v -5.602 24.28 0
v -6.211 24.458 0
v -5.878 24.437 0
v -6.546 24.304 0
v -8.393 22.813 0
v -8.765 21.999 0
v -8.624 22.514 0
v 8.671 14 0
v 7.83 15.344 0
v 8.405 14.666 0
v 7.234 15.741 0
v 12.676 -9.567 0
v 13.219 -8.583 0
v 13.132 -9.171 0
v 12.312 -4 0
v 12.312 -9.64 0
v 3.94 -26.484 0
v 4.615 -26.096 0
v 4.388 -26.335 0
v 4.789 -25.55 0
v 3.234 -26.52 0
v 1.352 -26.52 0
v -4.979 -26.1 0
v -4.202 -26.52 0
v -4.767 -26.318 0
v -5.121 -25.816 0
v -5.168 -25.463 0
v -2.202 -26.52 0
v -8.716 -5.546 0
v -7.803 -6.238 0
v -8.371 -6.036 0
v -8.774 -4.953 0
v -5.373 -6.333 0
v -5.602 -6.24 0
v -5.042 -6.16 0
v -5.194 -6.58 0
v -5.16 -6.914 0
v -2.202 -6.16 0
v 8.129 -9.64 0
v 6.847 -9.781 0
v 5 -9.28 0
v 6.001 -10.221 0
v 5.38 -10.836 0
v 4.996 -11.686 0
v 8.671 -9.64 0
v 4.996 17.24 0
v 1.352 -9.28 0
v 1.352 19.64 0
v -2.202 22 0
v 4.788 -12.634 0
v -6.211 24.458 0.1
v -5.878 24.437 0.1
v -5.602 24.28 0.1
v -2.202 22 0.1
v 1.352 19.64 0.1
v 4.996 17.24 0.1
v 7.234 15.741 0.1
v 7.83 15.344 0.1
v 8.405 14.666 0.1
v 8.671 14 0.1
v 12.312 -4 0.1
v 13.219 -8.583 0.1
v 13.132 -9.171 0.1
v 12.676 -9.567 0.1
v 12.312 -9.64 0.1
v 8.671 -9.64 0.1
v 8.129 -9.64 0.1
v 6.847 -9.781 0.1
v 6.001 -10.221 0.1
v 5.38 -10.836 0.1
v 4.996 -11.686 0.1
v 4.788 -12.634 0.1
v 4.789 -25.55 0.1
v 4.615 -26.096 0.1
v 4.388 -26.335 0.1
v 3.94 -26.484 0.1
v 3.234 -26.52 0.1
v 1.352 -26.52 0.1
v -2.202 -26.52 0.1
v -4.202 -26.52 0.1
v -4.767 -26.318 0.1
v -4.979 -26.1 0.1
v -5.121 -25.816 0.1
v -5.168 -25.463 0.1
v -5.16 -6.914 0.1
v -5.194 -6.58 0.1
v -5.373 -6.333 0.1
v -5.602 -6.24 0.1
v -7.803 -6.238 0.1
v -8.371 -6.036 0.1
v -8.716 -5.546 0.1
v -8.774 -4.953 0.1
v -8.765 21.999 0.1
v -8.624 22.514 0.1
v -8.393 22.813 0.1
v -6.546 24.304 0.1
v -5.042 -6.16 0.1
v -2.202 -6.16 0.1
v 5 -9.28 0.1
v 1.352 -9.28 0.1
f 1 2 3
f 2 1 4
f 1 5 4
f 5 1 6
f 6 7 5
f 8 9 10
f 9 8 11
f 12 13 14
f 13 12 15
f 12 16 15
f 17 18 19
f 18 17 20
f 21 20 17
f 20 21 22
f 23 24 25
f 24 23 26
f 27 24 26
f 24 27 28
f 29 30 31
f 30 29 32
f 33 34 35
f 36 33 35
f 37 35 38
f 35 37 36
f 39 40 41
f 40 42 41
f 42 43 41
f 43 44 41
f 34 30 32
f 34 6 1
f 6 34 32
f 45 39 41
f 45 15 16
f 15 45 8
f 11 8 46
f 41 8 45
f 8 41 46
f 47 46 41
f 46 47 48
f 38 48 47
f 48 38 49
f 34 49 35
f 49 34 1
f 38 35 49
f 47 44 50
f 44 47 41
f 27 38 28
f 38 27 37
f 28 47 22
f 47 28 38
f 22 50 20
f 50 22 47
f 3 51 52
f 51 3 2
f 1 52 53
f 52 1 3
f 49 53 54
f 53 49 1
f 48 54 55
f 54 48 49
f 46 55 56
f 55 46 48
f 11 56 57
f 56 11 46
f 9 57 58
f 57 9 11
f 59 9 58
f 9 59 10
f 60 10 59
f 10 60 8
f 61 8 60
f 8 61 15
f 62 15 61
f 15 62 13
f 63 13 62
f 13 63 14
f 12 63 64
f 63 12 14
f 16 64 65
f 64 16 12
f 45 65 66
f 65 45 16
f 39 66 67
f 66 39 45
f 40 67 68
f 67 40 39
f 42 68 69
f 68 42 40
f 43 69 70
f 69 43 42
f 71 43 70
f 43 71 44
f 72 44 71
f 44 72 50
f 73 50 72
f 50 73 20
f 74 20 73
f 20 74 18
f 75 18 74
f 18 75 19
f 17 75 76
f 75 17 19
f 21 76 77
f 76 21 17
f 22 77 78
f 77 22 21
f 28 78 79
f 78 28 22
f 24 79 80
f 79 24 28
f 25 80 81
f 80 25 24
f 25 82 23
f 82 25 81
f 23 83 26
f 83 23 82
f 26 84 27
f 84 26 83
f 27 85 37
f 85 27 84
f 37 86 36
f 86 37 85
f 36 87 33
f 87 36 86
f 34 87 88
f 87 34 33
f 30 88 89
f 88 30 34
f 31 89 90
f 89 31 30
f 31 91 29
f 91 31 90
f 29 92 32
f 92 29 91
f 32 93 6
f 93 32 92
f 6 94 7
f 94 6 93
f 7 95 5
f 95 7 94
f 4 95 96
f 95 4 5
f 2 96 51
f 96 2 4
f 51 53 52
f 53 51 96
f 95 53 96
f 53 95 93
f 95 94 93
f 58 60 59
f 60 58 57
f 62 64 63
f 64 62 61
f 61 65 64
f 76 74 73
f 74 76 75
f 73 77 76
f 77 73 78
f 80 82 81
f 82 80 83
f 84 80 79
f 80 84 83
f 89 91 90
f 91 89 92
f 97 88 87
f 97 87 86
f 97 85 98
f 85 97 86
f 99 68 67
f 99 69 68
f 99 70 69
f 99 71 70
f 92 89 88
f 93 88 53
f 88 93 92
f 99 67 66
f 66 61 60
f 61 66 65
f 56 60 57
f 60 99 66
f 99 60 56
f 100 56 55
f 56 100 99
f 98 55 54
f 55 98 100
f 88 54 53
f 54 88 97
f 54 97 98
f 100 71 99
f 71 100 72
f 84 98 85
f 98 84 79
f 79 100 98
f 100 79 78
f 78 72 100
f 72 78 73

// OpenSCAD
// file: s/13710as02.scad
use <../../lib.scad>
function ldraw_lib__s__13710as02() = [
// 0 ~Sticker Top for Technic Panel Fairing Smooth (Medium) Flat
// 0 Name: s\13710as02.dat
// 0 Author: Philippe Hurbain [Philo]
// 0 !LDRAW_ORG Subpart UPDATE 2022-02
// 0 !LICENSE Licensed under CC BY 4.0 : see CAreadme.txt
// 
// 0 BFC CERTIFY CCW
  [0,"BFC","CERTIFY"],
  [0,"BFC","CCW"],
// 
// 0 !HISTORY 2022-03-06 [PTadmin] Official Update 2022-02
// 
// 
// 0 // Top surface
// 4 16 16.364 -0.25 60.759 15.527 -0.25 61.145 14.695 -0.25 61.093 14.004 -0.25 60.7
  [4,16,16.364,-0.25,60.759,15.527,-0.25,61.145,14.695,-0.25,61.093,14.004,-0.25,60.7],
// 4 16 21.912 -0.25 54.998 20.983 -0.25 57.032 16.364 -0.25 60.759 14.004 -0.25 60.7
  [4,16,21.912,-0.25,54.998,20.983,-0.25,57.032,16.364,-0.25,60.759,14.004,-0.25,60.7],
// 3 16 21.912 -0.25 54.998 21.561 -0.25 56.284 20.983 -0.25 57.032
  [3,16,21.912,-0.25,54.998,21.561,-0.25,56.284,20.983,-0.25,57.032],
// 4 16 -18.084 -0.25 39.353 -19.575 -0.25 38.36 -21.013 -0.25 36.664 -21.677 -0.25 35
  [4,16,-18.084,-0.25,39.353,-19.575,-0.25,38.36,-21.013,-0.25,36.664,-21.677,-0.25,35],
// 4 16 -31.689 -0.25 -23.918 -30.78 -0.25 -10 -33.048 -0.25 -21.458 -32.83 -0.25 -22.928
  [4,16,-31.689,-0.25,-23.918,-30.78,-0.25,-10,-33.048,-0.25,-21.458,-32.83,-0.25,-22.928],
// 3 16 -31.689 -0.25 -23.918 -30.78 -0.25 -24.1 -30.78 -0.25 -10
  [3,16,-31.689,-0.25,-23.918,-30.78,-0.25,-24.1,-30.78,-0.25,-10],
// 4 16 -9.849 -0.25 -66.209 -11.972 -0.25 -63.874 -11.537 -0.25 -65.239 -10.971 -0.25 -65.837
  [4,16,-9.849,-0.25,-66.209,-11.972,-0.25,-63.874,-11.537,-0.25,-65.239,-10.971,-0.25,-65.837],
// 4 16 -3.379 -0.25 -66.3 -11.972 -0.25 -63.874 -9.849 -0.25 -66.209 -8.084 -0.25 -66.3
  [4,16,-3.379,-0.25,-66.3,-11.972,-0.25,-63.874,-9.849,-0.25,-66.209,-8.084,-0.25,-66.3],
// 4 16 12.802 -0.25 -64.539 10.504 -0.25 -66.3 11.917 -0.25 -65.795 12.448 -0.25 -65.249
  [4,16,12.802,-0.25,-64.539,10.504,-0.25,-66.3,11.917,-0.25,-65.795,12.448,-0.25,-65.249],
// 4 16 5.504 -0.25 -66.3 10.504 -0.25 -66.3 12.802 -0.25 -64.539 12.92 -0.25 -63.658
  [4,16,5.504,-0.25,-66.3,10.504,-0.25,-66.3,12.802,-0.25,-64.539,12.92,-0.25,-63.658],
// 4 16 19.507 -0.25 -15.595 20.928 -0.25 -15.089 21.79 -0.25 -13.866 21.935 -0.25 -12.382
  [4,16,19.507,-0.25,-15.595,20.928,-0.25,-15.089,21.79,-0.25,-13.866,21.935,-0.25,-12.382],
// 3 16 13.432 -0.25 -15.832 14.004 -0.25 -15.6 12.604 -0.25 -15.4
  [3,16,13.432,-0.25,-15.832,14.004,-0.25,-15.6,12.604,-0.25,-15.4],
// 3 16 12.984 -0.25 -16.45 13.432 -0.25 -15.832 12.604 -0.25 -15.4
  [3,16,12.984,-0.25,-16.45,13.432,-0.25,-15.832,12.604,-0.25,-15.4],
// 4 16 5.504 -0.25 -15.4 12.899 -0.25 -17.286 12.984 -0.25 -16.45 12.604 -0.25 -15.4
  [4,16,5.504,-0.25,-15.4,12.899,-0.25,-17.286,12.984,-0.25,-16.45,12.604,-0.25,-15.4],
// 3 16 -20.323 -0.25 -24.1 -17.118 -0.25 -24.453 -12.5 -0.25 -23.2
  [3,16,-20.323,-0.25,-24.1,-17.118,-0.25,-24.453,-12.5,-0.25,-23.2],
// 3 16 -17.118 -0.25 -24.453 -15.003 -0.25 -25.552 -12.5 -0.25 -23.2
  [3,16,-17.118,-0.25,-24.453,-15.003,-0.25,-25.552,-12.5,-0.25,-23.2],
// 3 16 -15.003 -0.25 -25.552 -13.45 -0.25 -27.089 -12.5 -0.25 -23.2
  [3,16,-15.003,-0.25,-25.552,-13.45,-0.25,-27.089,-12.5,-0.25,-23.2],
// 3 16 -13.45 -0.25 -27.089 -12.491 -0.25 -29.214 -12.5 -0.25 -23.2
  [3,16,-13.45,-0.25,-27.089,-12.491,-0.25,-29.214,-12.5,-0.25,-23.2],
// 3 16 14.004 -0.25 -15.6 19.507 -0.25 -15.595 21.935 -0.25 -12.382
  [3,16,14.004,-0.25,-15.6,19.507,-0.25,-15.595,21.935,-0.25,-12.382],
// 4 16 14.004 -0.25 60.7 14.004 -0.25 -15.6 21.935 -0.25 -12.382 21.912 -0.25 54.998
  [4,16,14.004,-0.25,60.7,14.004,-0.25,-15.6,21.935,-0.25,-12.382,21.912,-0.25,54.998],
// 3 16 -21.677 -0.25 -24.1 -20.323 -0.25 -24.1 -12.5 -0.25 -23.2
  [3,16,-21.677,-0.25,-24.1,-20.323,-0.25,-24.1,-12.5,-0.25,-23.2],
// 4 16 -30.78 -0.25 -24.1 -21.677 -0.25 -24.1 -21.677 -0.25 35 -30.78 -0.25 -10
  [4,16,-30.78,-0.25,-24.1,-21.677,-0.25,-24.1,-21.677,-0.25,35,-30.78,-0.25,-10],
// 3 16 -18.084 -0.25 39.353 -21.677 -0.25 35 -12.491 -0.25 43.1
  [3,16,-18.084,-0.25,39.353,-21.677,-0.25,35,-12.491,-0.25,43.1],
// 4 16 -21.677 -0.25 35 -21.677 -0.25 -24.1 -12.5 -0.25 -23.2 -12.491 -0.25 43.1
  [4,16,-21.677,-0.25,35,-21.677,-0.25,-24.1,-12.5,-0.25,-23.2,-12.491,-0.25,43.1],
// 4 16 -12.5 -0.25 -23.2 -3.379 -0.25 -23.2 -3.379 -0.25 49.1 -12.491 -0.25 43.1
  [4,16,-12.5,-0.25,-23.2,-3.379,-0.25,-23.2,-3.379,-0.25,49.1,-12.491,-0.25,43.1],
// 4 16 -3.379 -0.25 -23.2 5.504 -0.25 -15.4 5.504 -0.25 55 -3.379 -0.25 49.1
  [4,16,-3.379,-0.25,-23.2,5.504,-0.25,-15.4,5.504,-0.25,55,-3.379,-0.25,49.1],
// 4 16 14.004 -0.25 60.7 5.504 -0.25 55 12.604 -0.25 -15.4 14.004 -0.25 -15.6
  [4,16,14.004,-0.25,60.7,5.504,-0.25,55,12.604,-0.25,-15.4,14.004,-0.25,-15.6],
// 3 16 5.504 -0.25 -15.4 12.604 -0.25 -15.4 5.504 -0.25 55
  [3,16,5.504,-0.25,-15.4,12.604,-0.25,-15.4,5.504,-0.25,55],
// 4 16 -11.97 -0.25 -31.586 -3.379 -0.25 -23.2 -12.5 -0.25 -23.2 -12.491 -0.25 -29.214
  [4,16,-11.97,-0.25,-31.586,-3.379,-0.25,-23.2,-12.5,-0.25,-23.2,-12.491,-0.25,-29.214],
// 4 16 5.504 -0.25 -66.3 12.92 -0.25 -63.658 12.899 -0.25 -17.286 5.504 -0.25 -15.4
  [4,16,5.504,-0.25,-66.3,12.92,-0.25,-63.658,12.899,-0.25,-17.286,5.504,-0.25,-15.4],
// 4 16 -3.379 -0.25 -66.3 5.504 -0.25 -66.3 5.504 -0.25 -15.4 -3.379 -0.25 -23.2
  [4,16,-3.379,-0.25,-66.3,5.504,-0.25,-66.3,5.504,-0.25,-15.4,-3.379,-0.25,-23.2],
// 4 16 -11.972 -0.25 -63.874 -3.379 -0.25 -66.3 -3.379 -0.25 -23.2 -11.97 -0.25 -31.586
  [4,16,-11.972,-0.25,-63.874,-3.379,-0.25,-66.3,-3.379,-0.25,-23.2,-11.97,-0.25,-31.586],
];
module ldraw_lib__s__13710as02(step=0, col=false, unit=2/5, alt=false, line=0.2, solid=!$preview)
    makepoly(ldraw_lib__s__13710as02(), step=step, col=col, unit=unit, alt=alt, line=line, solid=solid);
ldraw_lib__s__13710as02(line=0.2);
// main file
use <../lib.scad>
use <s/13710as01.scad>
use <s/13710as02.scad>
function ldraw_lib__13710e() = [
// 0 Sticker Mindstorms EV3 #5 for Panel Smooth Medium (Needs Work)
// 0 Name: 13710e.dat
// 0 Author: Philippe Hurbain [Philo]
// 0 !LDRAW_ORG Part UPDATE 2022-02
// 0 !LICENSE Licensed under CC BY 4.0 : see CAreadme.txt
// 
// 0 !HELP To be used with panel 64391
// 
// 0 BFC CERTIFY CCW
  [0,"BFC","CERTIFY"],
  [0,"BFC","CCW"],
// 
// 0 !HISTORY 2022-03-06 [PTadmin] Official Update 2022-02
// 
// 
// 0 // Image file courtesy of the LEGO MINDSTORMS Team
// 0 // Needs Work: Missing more detailed fallback pattern
// 
// 1 16 0 0 0 -1 0 0 0 1 0 0 0 1 s\13710as01.dat
  [1,16,0,0,0,-1,0,0,0,1,0,0,0,1, ldraw_lib__s__13710as01()],
// 0 !TEXMAP START PLANAR 33.048 0 61.145 33.048 0 -66.3 -21.935 0 61.145 13710e.png
// 0 !: 1 15 0 0 0 -1 0 0 0 1 0 0 0 1 s\13710as02.dat
// 0 !TEXMAP FALLBACK
// 1 15 0 0 0 -1 0 0 0 1 0 0 0 1 s\13710as02.dat
  [1,15,0,0,0,-1,0,0,0,1,0,0,0,1, ldraw_lib__s__13710as02()],
// 0 !TEXMAP END
];
module ldraw_lib__13710e(step=0, col=false, unit=2/5, alt=false, line=0.2, solid=!$preview)
    makepoly(ldraw_lib__13710e(), step=step, col=col, unit=unit, alt=alt, line=line, solid=solid);
ldraw_lib__13710e(line=0.2);
